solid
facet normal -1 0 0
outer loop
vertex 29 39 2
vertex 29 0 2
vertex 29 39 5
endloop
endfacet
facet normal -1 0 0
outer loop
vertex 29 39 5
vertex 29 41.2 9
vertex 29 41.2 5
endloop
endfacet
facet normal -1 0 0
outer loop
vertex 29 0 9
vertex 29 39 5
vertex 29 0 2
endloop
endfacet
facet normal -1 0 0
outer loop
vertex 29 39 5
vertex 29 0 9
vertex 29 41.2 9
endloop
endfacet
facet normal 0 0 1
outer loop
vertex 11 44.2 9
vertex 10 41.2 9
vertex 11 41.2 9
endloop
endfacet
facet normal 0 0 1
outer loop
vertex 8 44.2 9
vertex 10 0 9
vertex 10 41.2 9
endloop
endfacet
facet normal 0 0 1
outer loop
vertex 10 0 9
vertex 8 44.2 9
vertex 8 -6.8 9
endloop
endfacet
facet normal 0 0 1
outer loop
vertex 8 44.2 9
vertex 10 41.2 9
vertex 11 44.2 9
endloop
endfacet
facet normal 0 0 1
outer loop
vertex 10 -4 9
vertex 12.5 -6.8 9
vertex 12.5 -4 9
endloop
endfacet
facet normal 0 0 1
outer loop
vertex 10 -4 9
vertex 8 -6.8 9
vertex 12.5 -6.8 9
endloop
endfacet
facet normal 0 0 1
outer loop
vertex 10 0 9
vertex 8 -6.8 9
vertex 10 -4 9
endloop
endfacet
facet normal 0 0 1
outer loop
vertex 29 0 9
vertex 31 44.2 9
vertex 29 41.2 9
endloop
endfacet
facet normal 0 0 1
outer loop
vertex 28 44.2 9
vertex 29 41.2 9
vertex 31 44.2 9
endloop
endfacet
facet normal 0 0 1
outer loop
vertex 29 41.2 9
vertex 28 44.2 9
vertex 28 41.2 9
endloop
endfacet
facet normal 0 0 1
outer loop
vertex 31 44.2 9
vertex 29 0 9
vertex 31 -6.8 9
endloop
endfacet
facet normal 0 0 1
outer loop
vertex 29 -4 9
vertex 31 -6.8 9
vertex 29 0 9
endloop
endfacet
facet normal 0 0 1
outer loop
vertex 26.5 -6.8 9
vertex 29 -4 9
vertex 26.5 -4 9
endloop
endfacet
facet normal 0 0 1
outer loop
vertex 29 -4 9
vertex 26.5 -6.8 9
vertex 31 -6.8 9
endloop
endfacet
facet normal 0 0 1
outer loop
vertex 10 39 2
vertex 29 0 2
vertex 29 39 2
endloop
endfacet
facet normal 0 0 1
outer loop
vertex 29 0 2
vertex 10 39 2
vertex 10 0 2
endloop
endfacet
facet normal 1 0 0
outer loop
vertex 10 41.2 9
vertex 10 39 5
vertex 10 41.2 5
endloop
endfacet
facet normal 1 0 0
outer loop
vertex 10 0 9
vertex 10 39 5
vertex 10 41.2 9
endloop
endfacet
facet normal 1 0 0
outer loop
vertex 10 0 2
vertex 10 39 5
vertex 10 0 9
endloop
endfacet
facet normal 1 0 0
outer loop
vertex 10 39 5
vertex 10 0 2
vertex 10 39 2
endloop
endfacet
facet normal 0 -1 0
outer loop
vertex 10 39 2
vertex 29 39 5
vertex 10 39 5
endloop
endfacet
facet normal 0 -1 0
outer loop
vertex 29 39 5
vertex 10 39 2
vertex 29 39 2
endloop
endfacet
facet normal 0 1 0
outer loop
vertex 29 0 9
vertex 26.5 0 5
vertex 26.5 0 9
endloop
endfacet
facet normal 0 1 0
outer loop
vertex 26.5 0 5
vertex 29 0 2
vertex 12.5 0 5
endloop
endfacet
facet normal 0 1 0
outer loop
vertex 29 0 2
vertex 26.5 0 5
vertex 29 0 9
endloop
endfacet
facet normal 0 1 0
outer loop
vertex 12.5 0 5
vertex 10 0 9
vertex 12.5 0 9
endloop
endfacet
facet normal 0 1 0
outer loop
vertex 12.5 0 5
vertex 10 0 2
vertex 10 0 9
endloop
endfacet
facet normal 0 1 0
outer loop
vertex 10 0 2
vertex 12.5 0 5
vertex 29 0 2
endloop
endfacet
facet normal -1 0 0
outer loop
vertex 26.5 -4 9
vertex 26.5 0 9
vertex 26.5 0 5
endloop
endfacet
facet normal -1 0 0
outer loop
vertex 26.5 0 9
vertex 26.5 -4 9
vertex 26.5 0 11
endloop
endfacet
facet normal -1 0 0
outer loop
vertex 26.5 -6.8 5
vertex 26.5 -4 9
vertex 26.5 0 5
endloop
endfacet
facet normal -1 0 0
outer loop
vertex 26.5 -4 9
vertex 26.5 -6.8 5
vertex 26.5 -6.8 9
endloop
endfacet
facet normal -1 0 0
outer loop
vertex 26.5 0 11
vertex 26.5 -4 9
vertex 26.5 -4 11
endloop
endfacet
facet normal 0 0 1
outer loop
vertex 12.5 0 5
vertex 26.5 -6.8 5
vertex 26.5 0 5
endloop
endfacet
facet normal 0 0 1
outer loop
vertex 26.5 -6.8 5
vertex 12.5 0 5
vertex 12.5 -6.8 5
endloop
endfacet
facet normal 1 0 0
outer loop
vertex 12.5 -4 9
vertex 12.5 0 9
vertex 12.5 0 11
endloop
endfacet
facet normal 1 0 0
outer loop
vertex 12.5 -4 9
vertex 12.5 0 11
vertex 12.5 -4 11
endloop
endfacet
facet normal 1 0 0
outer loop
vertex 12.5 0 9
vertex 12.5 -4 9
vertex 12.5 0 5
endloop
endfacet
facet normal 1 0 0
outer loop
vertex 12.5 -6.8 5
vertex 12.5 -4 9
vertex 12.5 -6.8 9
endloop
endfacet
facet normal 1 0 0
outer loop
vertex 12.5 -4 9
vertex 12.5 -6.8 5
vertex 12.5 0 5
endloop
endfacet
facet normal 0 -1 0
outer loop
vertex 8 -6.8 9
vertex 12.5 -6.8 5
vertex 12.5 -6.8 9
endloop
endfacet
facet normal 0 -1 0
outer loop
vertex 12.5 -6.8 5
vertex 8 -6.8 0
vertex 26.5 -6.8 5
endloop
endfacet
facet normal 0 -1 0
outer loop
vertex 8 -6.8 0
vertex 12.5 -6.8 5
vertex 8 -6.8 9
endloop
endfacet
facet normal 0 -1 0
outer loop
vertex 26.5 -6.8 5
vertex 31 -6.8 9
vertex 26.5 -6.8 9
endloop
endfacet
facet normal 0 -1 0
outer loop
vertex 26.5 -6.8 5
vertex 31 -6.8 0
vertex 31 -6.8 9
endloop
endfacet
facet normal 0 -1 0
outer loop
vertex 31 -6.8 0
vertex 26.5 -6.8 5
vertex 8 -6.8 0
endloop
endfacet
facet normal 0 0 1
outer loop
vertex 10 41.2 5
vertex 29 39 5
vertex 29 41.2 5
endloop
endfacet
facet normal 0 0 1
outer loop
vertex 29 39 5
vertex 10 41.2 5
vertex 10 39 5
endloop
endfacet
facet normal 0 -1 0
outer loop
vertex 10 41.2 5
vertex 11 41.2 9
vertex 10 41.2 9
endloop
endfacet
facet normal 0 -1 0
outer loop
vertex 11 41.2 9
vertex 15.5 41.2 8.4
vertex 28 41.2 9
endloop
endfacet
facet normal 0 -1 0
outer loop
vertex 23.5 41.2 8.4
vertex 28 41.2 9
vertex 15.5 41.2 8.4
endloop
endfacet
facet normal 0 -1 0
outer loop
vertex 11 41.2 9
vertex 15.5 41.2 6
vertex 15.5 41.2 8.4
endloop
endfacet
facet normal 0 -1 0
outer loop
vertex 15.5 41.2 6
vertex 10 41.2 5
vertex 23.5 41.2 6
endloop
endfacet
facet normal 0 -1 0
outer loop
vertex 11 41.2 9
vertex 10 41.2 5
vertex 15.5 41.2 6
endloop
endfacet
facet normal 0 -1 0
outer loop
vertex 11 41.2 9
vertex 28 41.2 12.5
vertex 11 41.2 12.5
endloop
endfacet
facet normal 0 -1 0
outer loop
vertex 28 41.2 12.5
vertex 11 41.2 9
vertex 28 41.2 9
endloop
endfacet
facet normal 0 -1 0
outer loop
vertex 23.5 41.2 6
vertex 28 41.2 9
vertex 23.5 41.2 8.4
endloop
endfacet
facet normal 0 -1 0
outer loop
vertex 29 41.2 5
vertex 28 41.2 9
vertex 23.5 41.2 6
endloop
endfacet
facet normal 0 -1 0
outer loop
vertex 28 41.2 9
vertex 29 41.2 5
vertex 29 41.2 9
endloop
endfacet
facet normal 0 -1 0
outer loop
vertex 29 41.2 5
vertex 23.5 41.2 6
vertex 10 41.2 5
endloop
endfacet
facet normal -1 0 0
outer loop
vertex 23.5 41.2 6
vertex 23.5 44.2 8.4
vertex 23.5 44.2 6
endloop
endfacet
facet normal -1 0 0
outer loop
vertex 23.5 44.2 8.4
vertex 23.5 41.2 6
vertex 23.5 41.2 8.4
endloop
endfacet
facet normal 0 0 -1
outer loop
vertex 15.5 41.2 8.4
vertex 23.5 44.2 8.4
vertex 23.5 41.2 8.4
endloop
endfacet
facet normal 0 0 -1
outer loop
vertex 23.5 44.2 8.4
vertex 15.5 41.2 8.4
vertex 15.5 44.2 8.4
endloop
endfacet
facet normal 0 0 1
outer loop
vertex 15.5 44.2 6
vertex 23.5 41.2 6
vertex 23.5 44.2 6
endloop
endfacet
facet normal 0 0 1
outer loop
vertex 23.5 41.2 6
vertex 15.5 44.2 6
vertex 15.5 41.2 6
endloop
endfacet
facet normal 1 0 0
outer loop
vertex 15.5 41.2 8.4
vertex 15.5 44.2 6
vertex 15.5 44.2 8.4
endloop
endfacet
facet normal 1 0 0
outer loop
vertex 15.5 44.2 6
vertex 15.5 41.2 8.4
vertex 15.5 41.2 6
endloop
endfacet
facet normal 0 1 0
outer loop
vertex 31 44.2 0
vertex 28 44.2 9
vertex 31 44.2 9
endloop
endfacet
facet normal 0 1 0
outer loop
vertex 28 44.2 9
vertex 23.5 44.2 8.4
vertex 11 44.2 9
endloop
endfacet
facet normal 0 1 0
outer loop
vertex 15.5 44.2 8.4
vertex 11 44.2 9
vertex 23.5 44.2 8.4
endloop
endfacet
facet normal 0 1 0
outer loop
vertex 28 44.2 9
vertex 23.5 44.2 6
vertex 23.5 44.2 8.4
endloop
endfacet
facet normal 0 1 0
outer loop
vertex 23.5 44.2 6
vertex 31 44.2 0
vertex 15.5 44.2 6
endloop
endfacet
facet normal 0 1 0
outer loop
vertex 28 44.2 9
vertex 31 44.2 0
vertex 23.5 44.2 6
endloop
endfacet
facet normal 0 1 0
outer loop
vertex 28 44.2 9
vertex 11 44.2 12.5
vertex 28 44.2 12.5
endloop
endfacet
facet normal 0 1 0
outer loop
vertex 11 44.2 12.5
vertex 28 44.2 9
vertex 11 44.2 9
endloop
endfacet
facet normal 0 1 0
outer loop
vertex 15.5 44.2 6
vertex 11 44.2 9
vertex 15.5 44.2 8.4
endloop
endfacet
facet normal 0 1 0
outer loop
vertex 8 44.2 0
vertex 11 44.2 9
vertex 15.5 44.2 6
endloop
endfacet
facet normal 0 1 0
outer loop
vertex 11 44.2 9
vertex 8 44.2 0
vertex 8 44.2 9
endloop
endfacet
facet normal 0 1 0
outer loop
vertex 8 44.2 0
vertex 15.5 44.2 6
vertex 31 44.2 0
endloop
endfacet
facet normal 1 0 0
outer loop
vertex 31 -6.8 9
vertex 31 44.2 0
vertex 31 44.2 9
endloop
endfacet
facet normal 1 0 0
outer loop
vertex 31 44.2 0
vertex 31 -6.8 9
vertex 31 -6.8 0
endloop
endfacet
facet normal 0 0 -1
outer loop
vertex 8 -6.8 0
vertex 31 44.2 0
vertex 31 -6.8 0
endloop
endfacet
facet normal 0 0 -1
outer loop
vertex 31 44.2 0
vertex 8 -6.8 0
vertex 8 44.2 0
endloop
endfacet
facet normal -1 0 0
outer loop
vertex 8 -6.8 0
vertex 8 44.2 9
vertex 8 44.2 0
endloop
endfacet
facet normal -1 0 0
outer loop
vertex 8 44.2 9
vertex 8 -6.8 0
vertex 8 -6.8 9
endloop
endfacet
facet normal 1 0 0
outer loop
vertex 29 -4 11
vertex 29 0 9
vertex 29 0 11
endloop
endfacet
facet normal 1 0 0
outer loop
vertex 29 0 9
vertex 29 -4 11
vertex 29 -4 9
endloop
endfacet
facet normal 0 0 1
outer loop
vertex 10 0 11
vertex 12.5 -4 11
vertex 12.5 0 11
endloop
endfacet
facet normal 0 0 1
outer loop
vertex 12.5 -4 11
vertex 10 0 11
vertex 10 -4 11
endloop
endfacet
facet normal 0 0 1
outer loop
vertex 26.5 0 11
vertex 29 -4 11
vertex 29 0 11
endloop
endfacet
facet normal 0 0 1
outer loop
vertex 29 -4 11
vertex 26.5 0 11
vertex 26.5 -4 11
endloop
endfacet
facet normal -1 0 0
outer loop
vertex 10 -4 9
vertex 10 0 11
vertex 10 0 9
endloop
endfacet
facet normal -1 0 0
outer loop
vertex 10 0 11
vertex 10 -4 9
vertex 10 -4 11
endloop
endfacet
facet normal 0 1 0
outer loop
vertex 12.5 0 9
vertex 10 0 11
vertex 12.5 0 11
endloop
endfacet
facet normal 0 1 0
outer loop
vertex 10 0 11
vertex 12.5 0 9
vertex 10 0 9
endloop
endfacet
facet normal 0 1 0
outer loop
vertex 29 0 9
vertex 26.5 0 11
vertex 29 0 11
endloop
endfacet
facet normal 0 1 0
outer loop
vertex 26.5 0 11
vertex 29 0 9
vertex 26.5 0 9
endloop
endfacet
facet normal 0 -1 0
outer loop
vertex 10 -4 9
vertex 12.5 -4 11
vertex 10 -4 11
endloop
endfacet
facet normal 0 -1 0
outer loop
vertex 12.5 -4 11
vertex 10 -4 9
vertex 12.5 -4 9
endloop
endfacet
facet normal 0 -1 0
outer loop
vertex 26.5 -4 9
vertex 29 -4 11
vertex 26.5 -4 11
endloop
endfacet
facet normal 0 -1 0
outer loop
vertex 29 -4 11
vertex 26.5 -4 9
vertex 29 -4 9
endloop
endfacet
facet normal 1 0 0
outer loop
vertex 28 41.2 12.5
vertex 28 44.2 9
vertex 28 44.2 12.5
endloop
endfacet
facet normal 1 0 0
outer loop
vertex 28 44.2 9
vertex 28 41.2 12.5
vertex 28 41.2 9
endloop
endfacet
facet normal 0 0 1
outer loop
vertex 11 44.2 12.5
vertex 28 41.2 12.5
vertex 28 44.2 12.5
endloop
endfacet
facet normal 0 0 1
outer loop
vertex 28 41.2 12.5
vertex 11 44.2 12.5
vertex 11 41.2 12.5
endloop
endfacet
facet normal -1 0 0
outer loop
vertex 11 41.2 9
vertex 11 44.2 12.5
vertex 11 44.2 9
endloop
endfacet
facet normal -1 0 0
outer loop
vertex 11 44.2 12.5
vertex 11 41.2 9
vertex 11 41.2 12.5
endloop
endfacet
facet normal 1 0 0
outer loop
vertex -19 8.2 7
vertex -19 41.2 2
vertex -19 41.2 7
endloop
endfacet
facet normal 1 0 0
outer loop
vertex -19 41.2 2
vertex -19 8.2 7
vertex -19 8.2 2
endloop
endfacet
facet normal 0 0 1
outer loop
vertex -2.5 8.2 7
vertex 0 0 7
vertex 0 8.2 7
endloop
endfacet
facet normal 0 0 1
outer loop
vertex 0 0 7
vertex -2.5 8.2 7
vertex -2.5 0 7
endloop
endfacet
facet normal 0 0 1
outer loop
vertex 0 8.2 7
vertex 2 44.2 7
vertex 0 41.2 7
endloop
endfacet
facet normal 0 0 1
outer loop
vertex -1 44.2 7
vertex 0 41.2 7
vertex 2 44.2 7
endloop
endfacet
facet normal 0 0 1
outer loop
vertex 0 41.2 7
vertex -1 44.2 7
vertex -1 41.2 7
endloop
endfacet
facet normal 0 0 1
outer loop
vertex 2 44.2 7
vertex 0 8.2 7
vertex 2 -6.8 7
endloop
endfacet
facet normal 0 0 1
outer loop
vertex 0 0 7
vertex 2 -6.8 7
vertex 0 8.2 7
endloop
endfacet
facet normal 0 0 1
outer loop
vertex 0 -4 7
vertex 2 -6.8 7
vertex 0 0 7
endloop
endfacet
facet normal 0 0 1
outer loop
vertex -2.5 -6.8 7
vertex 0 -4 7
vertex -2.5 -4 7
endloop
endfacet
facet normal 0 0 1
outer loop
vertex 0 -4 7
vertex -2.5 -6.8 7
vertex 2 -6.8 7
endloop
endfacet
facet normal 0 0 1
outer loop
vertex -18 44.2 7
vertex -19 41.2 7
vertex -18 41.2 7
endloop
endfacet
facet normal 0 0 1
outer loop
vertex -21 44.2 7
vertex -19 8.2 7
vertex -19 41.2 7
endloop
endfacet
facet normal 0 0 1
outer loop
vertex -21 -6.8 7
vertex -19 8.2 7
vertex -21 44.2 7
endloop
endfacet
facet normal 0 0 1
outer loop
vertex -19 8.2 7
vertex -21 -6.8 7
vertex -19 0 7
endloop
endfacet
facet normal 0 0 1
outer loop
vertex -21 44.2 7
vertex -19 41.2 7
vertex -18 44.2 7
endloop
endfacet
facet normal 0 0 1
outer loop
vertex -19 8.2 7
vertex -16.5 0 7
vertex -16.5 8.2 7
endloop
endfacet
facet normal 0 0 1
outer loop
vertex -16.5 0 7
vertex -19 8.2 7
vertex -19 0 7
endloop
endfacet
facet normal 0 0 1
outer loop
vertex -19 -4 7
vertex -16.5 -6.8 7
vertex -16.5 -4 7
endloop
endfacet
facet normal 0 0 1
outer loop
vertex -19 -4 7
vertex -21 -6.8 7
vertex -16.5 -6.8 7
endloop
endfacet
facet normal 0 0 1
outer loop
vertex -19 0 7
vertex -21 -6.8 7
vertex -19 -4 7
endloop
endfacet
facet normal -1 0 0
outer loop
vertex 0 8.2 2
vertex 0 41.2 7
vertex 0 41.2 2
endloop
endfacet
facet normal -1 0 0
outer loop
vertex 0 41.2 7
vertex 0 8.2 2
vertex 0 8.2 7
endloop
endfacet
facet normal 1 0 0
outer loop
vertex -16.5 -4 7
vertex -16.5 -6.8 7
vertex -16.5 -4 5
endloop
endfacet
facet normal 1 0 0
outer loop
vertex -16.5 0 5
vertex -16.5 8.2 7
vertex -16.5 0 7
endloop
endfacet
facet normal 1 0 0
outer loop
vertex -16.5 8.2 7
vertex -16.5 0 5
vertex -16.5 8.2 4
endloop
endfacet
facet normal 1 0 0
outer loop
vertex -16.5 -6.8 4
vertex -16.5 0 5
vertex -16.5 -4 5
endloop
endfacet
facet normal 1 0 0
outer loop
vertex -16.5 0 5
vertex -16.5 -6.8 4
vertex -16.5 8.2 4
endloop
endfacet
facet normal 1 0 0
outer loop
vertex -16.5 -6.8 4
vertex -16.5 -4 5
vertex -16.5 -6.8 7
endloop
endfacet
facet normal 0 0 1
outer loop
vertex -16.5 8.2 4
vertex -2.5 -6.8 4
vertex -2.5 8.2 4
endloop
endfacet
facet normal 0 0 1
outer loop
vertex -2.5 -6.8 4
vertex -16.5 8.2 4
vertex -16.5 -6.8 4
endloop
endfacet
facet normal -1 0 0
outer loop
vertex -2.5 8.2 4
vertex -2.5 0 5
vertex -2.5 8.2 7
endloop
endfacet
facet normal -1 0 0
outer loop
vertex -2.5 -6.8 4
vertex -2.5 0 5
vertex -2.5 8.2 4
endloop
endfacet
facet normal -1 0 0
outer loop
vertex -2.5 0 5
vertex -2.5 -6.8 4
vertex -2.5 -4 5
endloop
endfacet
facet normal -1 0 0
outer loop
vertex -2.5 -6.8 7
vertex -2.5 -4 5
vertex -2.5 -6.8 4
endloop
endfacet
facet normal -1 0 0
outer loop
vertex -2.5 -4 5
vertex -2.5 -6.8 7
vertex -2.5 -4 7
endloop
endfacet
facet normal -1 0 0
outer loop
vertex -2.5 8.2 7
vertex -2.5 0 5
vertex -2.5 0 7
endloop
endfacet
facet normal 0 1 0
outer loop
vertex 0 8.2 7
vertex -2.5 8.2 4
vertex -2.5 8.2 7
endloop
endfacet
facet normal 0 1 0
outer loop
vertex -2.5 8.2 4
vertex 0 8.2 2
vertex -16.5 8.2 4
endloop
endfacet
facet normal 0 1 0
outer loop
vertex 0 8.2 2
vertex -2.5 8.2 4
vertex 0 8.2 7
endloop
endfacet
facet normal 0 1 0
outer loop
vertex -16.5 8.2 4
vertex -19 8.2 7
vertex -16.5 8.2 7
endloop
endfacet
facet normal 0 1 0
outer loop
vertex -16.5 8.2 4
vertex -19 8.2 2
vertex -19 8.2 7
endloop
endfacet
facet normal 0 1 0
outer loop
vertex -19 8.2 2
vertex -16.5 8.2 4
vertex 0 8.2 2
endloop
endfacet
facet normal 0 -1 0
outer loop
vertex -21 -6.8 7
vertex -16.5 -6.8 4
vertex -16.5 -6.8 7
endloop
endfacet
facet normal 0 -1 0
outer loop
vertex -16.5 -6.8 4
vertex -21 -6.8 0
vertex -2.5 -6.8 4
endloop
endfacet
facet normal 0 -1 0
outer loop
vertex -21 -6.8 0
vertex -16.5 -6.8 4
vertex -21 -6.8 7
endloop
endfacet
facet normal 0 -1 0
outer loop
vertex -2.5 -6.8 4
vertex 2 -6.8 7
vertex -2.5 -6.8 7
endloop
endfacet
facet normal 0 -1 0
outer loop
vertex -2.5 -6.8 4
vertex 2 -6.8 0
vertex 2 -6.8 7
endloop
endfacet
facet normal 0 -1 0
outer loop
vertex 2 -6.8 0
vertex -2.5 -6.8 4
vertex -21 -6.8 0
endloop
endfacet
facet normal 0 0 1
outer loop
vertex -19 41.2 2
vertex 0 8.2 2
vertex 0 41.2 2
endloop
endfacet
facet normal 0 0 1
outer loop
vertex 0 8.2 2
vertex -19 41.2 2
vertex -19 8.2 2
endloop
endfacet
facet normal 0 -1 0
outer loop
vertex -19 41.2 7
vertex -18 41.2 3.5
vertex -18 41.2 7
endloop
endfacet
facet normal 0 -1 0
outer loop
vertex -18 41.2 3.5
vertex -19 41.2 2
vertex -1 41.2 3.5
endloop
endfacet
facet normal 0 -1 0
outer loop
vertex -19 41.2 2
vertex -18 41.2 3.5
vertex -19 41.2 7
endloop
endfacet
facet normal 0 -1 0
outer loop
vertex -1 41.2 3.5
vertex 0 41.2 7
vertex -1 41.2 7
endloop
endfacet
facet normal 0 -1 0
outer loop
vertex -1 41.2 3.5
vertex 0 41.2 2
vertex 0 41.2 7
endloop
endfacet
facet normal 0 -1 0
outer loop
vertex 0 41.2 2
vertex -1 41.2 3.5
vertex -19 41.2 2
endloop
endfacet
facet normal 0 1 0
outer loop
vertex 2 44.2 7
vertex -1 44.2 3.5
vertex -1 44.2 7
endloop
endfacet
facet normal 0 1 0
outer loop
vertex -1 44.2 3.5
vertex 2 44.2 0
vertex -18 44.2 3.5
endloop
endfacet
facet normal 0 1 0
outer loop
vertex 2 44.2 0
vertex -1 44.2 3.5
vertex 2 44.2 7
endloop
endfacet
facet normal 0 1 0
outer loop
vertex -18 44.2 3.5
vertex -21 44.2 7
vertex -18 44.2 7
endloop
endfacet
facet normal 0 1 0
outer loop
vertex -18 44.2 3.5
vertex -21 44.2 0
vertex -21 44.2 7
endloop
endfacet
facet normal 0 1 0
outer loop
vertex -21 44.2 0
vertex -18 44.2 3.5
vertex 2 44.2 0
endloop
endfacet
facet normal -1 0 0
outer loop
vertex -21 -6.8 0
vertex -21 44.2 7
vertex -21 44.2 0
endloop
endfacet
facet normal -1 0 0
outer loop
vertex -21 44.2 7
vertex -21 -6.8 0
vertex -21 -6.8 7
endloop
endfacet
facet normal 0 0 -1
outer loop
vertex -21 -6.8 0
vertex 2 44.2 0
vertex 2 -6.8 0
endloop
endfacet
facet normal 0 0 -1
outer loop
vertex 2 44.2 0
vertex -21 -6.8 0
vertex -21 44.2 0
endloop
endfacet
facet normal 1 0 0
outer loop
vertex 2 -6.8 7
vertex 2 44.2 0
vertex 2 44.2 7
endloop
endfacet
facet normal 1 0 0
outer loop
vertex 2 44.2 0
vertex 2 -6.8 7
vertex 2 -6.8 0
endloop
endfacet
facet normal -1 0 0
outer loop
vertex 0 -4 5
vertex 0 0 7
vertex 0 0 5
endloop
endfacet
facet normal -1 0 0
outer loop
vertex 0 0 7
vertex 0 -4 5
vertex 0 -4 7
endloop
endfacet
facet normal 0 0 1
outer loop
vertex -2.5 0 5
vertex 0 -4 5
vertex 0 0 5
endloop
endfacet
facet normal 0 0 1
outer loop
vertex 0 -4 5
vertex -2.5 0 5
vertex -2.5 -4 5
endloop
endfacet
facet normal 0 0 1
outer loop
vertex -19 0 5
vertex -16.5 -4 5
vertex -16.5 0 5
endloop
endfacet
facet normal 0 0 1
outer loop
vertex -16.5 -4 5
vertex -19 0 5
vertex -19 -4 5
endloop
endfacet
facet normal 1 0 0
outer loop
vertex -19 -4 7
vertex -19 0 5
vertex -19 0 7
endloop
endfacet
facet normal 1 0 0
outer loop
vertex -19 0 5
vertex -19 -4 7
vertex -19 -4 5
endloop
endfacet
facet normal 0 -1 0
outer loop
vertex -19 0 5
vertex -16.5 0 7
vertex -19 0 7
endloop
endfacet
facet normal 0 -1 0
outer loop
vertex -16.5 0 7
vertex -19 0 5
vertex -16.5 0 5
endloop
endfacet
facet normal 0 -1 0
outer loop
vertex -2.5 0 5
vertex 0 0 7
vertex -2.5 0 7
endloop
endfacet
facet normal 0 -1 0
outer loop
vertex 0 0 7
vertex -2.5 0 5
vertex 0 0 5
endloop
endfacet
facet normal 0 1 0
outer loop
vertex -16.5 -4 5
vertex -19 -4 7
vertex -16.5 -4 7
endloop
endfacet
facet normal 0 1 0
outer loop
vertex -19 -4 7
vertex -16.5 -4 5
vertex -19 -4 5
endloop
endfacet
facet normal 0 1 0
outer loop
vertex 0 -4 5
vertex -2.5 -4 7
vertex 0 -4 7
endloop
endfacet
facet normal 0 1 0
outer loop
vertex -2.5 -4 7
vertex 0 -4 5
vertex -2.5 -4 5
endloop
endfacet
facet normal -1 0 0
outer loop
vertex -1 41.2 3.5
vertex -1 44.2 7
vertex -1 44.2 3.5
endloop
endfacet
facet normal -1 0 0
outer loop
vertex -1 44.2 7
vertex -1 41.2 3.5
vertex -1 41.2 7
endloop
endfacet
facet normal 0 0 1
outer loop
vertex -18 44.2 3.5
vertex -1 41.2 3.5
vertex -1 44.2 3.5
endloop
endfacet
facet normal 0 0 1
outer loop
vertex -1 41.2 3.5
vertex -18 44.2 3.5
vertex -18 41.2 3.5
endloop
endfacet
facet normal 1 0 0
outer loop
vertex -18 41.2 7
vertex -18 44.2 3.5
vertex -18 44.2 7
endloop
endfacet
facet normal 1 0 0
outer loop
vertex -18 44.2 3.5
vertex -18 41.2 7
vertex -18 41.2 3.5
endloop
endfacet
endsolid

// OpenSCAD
module case(){
    translate([0, 0, 2]) { // bring to ground level
        difference () {
            // case bounding cube:
            translate([-2,-6.8,-2]) {
                cube([23,6.8+8.2+29+7,16]);
            }
            // interior space cut out:
            union() {
                //base
                translate([0,0,0]) {
                    cube([19,39,7], false);
                }
                //upper base
                translate([2.5,-6.8,3]) {
                    cube([14,15,7], false);
                }
                //usb A
                translate([0,8.2,3]) {
                    cube([19,33,9], false);
                }
                //micro usb
                translate([11/2,8.2+29,4]) {
                    cube([8,7,2.4], false);
                }
            }
        }
    }
}

// bottom half (9mm height):
translate([0, 0, 1]) { // translate back to ground level
    difference() {
        translate([10, 0, -1]) { // cut of 1mm less bottom
            case();
        }
        difference() {
            // cut off
            translate([0, 0, 16]) {
                cube([300, 300, 16], true);
            }
            // add hook 1 bottom
            translate([19.5, -2, 9]) {
                cube([19, 4, 2], true);
            }
            // add hook 2 bottom
            translate([19.5, 43, 9]) {
                cube([17, 4, 5], true);
            }
        }


    }
}

// bottom half (7mm height):
translate([0, 0, -1]) { // translate back to ground level

    difference() {
        translate([0, 0, 16 + 1]) { // cut of 1mm more top
            rotate([0, 180, 0]) { // rotate for top half
                case();
            }
        }

        // cut off
        translate([0, 0, 16]) {
            cube([300, 300, 16], true);
        }

        // add hook 1 top
        translate([-9.5, -2, 7]) {
            cube([19, 4, 2], true);
        }
        // add hook 2 top
        translate([-9.5, 43, 7]) {
            cube([17, 4, 5], true);
        }
    }
}
